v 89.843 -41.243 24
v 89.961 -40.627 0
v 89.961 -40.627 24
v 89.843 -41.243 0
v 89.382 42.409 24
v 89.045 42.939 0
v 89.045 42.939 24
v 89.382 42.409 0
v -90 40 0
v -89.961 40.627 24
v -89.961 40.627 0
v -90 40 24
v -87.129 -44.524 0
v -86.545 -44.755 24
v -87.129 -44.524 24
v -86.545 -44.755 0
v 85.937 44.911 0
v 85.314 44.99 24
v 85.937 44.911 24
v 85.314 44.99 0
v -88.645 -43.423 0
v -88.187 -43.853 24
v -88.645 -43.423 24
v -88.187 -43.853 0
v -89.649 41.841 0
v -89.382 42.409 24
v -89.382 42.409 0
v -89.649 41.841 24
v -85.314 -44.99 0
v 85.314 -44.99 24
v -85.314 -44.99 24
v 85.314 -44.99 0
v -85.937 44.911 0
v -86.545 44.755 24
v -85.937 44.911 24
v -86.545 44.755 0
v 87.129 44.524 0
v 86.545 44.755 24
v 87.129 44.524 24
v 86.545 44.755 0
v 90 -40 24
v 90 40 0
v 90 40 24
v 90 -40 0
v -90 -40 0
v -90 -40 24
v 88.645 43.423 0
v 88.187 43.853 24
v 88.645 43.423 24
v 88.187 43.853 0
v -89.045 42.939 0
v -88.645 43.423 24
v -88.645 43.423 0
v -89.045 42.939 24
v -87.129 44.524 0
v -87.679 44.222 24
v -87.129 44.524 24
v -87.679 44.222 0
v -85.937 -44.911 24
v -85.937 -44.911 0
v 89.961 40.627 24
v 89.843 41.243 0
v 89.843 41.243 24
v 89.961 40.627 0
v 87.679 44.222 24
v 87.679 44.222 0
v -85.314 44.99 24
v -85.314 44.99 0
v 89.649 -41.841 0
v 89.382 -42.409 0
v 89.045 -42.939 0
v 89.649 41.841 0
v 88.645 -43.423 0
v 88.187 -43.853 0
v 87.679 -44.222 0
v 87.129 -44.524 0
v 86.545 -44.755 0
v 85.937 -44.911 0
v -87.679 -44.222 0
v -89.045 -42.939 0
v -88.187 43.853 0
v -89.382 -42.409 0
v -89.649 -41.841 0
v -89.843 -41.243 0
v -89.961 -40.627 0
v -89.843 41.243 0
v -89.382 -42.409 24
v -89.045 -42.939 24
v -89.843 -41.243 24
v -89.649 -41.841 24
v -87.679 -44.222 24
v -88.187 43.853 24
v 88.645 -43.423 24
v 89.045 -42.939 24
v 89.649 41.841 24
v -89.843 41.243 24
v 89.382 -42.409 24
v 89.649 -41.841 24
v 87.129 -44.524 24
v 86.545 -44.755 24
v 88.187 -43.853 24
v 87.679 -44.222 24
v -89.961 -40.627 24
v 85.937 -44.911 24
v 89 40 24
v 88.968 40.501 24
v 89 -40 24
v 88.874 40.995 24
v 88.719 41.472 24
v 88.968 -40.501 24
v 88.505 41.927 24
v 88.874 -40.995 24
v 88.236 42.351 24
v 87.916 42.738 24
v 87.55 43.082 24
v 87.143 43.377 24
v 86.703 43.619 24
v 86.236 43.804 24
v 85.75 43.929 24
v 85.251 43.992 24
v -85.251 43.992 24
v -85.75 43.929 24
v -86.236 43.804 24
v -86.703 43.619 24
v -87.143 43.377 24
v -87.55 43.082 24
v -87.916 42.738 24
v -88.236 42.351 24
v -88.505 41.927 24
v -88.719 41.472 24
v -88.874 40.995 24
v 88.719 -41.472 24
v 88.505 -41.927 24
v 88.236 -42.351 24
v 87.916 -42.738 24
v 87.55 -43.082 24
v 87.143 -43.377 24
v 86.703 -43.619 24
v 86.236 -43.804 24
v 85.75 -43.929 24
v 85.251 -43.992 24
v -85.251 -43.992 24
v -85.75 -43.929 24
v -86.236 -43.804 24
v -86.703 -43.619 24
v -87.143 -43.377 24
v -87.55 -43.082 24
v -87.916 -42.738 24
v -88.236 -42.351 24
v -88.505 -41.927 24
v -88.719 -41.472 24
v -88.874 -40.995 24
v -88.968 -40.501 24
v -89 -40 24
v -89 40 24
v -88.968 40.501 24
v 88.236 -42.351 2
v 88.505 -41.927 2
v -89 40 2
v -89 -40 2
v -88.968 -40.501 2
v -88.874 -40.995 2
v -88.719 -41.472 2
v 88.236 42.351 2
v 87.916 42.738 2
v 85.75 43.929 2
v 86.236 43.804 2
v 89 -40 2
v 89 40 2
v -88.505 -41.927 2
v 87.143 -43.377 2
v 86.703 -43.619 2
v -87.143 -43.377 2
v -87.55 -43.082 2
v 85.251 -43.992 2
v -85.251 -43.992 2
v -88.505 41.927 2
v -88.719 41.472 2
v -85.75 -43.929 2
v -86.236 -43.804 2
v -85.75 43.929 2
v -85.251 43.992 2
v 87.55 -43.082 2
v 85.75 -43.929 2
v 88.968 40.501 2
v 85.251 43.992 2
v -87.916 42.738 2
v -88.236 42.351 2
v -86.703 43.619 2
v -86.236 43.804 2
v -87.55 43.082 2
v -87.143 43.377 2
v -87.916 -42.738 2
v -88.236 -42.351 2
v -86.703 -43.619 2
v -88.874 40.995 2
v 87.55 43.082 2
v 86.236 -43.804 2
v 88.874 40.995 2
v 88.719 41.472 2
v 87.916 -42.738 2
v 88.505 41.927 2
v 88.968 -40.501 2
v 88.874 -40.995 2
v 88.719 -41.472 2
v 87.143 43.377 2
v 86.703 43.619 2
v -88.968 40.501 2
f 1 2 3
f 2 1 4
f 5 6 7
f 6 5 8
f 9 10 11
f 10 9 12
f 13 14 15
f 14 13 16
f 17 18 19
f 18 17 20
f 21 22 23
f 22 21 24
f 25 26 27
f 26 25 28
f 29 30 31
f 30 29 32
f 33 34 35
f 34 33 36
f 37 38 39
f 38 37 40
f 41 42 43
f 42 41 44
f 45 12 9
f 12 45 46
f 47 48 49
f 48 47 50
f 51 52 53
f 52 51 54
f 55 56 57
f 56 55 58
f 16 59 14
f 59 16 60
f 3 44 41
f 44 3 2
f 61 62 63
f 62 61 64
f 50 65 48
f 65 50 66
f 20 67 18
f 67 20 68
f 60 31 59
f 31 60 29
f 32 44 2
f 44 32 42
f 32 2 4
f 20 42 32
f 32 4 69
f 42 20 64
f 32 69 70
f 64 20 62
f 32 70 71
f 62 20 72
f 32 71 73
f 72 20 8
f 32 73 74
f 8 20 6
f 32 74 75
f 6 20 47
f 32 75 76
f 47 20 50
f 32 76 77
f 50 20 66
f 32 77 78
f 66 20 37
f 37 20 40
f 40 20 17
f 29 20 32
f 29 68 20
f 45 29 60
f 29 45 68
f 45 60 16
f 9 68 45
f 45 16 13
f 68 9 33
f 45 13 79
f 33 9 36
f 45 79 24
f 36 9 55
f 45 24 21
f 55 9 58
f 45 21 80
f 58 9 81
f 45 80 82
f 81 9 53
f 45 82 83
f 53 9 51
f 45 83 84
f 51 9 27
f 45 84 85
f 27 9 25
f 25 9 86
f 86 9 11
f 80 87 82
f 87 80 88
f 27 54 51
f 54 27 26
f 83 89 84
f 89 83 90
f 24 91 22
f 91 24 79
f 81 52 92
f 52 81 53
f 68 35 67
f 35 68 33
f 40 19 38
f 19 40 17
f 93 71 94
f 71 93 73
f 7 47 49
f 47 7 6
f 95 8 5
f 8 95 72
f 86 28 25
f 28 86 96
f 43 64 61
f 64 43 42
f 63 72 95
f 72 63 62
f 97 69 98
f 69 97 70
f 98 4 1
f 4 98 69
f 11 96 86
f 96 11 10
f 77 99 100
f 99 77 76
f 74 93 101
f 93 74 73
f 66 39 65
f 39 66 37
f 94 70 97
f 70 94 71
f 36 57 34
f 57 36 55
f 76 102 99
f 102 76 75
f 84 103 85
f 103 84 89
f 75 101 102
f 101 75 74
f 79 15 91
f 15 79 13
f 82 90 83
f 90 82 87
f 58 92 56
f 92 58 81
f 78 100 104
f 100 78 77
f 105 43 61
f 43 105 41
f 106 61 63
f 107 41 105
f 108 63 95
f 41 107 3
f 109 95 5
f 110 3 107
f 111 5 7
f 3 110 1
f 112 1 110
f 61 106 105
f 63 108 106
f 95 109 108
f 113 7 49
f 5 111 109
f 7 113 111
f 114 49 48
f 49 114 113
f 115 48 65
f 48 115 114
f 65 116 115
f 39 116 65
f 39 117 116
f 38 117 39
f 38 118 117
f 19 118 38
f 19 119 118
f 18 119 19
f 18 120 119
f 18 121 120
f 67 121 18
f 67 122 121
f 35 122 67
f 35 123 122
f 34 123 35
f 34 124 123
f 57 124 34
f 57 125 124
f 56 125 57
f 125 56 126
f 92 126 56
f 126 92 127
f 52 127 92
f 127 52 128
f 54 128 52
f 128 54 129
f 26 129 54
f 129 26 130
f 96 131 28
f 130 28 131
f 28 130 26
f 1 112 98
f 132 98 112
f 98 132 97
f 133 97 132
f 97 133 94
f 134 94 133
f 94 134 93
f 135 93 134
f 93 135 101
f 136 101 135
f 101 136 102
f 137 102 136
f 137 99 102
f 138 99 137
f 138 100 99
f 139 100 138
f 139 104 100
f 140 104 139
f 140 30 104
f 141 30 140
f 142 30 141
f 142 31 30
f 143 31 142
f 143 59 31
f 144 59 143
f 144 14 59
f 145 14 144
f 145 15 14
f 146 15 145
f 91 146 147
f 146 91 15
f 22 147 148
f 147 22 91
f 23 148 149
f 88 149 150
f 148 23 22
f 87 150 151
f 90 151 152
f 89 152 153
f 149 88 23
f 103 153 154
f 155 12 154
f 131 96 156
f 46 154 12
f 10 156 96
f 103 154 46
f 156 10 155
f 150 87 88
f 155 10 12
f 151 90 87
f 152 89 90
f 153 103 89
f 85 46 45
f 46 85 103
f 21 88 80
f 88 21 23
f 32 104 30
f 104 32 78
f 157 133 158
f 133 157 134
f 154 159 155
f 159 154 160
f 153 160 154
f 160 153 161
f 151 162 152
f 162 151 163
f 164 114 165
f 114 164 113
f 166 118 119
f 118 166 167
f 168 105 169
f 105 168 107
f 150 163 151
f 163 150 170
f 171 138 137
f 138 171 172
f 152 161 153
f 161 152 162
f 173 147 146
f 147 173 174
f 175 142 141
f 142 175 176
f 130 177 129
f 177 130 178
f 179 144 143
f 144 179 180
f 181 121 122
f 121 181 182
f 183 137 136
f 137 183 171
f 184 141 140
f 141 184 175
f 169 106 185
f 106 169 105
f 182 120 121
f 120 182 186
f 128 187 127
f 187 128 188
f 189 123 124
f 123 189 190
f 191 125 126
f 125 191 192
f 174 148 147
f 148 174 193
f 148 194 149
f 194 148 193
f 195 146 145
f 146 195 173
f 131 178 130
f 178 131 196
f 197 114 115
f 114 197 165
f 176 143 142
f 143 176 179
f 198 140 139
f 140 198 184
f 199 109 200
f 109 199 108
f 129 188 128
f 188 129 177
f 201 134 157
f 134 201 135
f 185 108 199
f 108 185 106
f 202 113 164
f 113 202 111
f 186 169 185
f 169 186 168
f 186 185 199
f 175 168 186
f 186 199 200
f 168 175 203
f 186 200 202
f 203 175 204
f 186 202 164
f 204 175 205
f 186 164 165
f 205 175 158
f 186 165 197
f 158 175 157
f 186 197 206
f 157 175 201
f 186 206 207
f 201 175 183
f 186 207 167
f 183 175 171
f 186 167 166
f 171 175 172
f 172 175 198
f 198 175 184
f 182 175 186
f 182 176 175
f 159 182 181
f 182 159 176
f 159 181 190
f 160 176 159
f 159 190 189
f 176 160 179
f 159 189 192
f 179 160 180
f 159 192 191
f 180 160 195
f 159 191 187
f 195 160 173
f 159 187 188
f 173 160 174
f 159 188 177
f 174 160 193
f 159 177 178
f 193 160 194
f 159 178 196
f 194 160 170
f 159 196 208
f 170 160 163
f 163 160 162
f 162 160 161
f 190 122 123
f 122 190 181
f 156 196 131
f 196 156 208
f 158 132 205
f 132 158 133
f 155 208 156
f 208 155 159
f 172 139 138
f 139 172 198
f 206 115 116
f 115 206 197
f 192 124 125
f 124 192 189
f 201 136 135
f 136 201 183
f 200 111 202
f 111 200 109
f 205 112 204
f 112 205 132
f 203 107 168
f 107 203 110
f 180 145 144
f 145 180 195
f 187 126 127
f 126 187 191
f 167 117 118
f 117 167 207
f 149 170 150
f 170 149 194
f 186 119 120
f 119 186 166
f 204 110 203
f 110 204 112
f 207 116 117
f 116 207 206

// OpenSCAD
$fn = 50;


difference() {
	union() {
		hull() {
			translate(v = [-85.0000000000, 40.0000000000, 0]) {
				cylinder(h = 24, r = 5);
			}
			translate(v = [85.0000000000, 40.0000000000, 0]) {
				cylinder(h = 24, r = 5);
			}
			translate(v = [-85.0000000000, -40.0000000000, 0]) {
				cylinder(h = 24, r = 5);
			}
			translate(v = [85.0000000000, -40.0000000000, 0]) {
				cylinder(h = 24, r = 5);
			}
		}
	}
	union() {
		translate(v = [0, 0, 2]) {
			hull() {
				translate(v = [-85.0000000000, 40.0000000000, 0]) {
					cylinder(h = 22, r = 4);
				}
				translate(v = [85.0000000000, 40.0000000000, 0]) {
					cylinder(h = 22, r = 4);
				}
				translate(v = [-85.0000000000, -40.0000000000, 0]) {
					cylinder(h = 22, r = 4);
				}
				translate(v = [85.0000000000, -40.0000000000, 0]) {
					cylinder(h = 22, r = 4);
				}
			}
		}
	}
}
